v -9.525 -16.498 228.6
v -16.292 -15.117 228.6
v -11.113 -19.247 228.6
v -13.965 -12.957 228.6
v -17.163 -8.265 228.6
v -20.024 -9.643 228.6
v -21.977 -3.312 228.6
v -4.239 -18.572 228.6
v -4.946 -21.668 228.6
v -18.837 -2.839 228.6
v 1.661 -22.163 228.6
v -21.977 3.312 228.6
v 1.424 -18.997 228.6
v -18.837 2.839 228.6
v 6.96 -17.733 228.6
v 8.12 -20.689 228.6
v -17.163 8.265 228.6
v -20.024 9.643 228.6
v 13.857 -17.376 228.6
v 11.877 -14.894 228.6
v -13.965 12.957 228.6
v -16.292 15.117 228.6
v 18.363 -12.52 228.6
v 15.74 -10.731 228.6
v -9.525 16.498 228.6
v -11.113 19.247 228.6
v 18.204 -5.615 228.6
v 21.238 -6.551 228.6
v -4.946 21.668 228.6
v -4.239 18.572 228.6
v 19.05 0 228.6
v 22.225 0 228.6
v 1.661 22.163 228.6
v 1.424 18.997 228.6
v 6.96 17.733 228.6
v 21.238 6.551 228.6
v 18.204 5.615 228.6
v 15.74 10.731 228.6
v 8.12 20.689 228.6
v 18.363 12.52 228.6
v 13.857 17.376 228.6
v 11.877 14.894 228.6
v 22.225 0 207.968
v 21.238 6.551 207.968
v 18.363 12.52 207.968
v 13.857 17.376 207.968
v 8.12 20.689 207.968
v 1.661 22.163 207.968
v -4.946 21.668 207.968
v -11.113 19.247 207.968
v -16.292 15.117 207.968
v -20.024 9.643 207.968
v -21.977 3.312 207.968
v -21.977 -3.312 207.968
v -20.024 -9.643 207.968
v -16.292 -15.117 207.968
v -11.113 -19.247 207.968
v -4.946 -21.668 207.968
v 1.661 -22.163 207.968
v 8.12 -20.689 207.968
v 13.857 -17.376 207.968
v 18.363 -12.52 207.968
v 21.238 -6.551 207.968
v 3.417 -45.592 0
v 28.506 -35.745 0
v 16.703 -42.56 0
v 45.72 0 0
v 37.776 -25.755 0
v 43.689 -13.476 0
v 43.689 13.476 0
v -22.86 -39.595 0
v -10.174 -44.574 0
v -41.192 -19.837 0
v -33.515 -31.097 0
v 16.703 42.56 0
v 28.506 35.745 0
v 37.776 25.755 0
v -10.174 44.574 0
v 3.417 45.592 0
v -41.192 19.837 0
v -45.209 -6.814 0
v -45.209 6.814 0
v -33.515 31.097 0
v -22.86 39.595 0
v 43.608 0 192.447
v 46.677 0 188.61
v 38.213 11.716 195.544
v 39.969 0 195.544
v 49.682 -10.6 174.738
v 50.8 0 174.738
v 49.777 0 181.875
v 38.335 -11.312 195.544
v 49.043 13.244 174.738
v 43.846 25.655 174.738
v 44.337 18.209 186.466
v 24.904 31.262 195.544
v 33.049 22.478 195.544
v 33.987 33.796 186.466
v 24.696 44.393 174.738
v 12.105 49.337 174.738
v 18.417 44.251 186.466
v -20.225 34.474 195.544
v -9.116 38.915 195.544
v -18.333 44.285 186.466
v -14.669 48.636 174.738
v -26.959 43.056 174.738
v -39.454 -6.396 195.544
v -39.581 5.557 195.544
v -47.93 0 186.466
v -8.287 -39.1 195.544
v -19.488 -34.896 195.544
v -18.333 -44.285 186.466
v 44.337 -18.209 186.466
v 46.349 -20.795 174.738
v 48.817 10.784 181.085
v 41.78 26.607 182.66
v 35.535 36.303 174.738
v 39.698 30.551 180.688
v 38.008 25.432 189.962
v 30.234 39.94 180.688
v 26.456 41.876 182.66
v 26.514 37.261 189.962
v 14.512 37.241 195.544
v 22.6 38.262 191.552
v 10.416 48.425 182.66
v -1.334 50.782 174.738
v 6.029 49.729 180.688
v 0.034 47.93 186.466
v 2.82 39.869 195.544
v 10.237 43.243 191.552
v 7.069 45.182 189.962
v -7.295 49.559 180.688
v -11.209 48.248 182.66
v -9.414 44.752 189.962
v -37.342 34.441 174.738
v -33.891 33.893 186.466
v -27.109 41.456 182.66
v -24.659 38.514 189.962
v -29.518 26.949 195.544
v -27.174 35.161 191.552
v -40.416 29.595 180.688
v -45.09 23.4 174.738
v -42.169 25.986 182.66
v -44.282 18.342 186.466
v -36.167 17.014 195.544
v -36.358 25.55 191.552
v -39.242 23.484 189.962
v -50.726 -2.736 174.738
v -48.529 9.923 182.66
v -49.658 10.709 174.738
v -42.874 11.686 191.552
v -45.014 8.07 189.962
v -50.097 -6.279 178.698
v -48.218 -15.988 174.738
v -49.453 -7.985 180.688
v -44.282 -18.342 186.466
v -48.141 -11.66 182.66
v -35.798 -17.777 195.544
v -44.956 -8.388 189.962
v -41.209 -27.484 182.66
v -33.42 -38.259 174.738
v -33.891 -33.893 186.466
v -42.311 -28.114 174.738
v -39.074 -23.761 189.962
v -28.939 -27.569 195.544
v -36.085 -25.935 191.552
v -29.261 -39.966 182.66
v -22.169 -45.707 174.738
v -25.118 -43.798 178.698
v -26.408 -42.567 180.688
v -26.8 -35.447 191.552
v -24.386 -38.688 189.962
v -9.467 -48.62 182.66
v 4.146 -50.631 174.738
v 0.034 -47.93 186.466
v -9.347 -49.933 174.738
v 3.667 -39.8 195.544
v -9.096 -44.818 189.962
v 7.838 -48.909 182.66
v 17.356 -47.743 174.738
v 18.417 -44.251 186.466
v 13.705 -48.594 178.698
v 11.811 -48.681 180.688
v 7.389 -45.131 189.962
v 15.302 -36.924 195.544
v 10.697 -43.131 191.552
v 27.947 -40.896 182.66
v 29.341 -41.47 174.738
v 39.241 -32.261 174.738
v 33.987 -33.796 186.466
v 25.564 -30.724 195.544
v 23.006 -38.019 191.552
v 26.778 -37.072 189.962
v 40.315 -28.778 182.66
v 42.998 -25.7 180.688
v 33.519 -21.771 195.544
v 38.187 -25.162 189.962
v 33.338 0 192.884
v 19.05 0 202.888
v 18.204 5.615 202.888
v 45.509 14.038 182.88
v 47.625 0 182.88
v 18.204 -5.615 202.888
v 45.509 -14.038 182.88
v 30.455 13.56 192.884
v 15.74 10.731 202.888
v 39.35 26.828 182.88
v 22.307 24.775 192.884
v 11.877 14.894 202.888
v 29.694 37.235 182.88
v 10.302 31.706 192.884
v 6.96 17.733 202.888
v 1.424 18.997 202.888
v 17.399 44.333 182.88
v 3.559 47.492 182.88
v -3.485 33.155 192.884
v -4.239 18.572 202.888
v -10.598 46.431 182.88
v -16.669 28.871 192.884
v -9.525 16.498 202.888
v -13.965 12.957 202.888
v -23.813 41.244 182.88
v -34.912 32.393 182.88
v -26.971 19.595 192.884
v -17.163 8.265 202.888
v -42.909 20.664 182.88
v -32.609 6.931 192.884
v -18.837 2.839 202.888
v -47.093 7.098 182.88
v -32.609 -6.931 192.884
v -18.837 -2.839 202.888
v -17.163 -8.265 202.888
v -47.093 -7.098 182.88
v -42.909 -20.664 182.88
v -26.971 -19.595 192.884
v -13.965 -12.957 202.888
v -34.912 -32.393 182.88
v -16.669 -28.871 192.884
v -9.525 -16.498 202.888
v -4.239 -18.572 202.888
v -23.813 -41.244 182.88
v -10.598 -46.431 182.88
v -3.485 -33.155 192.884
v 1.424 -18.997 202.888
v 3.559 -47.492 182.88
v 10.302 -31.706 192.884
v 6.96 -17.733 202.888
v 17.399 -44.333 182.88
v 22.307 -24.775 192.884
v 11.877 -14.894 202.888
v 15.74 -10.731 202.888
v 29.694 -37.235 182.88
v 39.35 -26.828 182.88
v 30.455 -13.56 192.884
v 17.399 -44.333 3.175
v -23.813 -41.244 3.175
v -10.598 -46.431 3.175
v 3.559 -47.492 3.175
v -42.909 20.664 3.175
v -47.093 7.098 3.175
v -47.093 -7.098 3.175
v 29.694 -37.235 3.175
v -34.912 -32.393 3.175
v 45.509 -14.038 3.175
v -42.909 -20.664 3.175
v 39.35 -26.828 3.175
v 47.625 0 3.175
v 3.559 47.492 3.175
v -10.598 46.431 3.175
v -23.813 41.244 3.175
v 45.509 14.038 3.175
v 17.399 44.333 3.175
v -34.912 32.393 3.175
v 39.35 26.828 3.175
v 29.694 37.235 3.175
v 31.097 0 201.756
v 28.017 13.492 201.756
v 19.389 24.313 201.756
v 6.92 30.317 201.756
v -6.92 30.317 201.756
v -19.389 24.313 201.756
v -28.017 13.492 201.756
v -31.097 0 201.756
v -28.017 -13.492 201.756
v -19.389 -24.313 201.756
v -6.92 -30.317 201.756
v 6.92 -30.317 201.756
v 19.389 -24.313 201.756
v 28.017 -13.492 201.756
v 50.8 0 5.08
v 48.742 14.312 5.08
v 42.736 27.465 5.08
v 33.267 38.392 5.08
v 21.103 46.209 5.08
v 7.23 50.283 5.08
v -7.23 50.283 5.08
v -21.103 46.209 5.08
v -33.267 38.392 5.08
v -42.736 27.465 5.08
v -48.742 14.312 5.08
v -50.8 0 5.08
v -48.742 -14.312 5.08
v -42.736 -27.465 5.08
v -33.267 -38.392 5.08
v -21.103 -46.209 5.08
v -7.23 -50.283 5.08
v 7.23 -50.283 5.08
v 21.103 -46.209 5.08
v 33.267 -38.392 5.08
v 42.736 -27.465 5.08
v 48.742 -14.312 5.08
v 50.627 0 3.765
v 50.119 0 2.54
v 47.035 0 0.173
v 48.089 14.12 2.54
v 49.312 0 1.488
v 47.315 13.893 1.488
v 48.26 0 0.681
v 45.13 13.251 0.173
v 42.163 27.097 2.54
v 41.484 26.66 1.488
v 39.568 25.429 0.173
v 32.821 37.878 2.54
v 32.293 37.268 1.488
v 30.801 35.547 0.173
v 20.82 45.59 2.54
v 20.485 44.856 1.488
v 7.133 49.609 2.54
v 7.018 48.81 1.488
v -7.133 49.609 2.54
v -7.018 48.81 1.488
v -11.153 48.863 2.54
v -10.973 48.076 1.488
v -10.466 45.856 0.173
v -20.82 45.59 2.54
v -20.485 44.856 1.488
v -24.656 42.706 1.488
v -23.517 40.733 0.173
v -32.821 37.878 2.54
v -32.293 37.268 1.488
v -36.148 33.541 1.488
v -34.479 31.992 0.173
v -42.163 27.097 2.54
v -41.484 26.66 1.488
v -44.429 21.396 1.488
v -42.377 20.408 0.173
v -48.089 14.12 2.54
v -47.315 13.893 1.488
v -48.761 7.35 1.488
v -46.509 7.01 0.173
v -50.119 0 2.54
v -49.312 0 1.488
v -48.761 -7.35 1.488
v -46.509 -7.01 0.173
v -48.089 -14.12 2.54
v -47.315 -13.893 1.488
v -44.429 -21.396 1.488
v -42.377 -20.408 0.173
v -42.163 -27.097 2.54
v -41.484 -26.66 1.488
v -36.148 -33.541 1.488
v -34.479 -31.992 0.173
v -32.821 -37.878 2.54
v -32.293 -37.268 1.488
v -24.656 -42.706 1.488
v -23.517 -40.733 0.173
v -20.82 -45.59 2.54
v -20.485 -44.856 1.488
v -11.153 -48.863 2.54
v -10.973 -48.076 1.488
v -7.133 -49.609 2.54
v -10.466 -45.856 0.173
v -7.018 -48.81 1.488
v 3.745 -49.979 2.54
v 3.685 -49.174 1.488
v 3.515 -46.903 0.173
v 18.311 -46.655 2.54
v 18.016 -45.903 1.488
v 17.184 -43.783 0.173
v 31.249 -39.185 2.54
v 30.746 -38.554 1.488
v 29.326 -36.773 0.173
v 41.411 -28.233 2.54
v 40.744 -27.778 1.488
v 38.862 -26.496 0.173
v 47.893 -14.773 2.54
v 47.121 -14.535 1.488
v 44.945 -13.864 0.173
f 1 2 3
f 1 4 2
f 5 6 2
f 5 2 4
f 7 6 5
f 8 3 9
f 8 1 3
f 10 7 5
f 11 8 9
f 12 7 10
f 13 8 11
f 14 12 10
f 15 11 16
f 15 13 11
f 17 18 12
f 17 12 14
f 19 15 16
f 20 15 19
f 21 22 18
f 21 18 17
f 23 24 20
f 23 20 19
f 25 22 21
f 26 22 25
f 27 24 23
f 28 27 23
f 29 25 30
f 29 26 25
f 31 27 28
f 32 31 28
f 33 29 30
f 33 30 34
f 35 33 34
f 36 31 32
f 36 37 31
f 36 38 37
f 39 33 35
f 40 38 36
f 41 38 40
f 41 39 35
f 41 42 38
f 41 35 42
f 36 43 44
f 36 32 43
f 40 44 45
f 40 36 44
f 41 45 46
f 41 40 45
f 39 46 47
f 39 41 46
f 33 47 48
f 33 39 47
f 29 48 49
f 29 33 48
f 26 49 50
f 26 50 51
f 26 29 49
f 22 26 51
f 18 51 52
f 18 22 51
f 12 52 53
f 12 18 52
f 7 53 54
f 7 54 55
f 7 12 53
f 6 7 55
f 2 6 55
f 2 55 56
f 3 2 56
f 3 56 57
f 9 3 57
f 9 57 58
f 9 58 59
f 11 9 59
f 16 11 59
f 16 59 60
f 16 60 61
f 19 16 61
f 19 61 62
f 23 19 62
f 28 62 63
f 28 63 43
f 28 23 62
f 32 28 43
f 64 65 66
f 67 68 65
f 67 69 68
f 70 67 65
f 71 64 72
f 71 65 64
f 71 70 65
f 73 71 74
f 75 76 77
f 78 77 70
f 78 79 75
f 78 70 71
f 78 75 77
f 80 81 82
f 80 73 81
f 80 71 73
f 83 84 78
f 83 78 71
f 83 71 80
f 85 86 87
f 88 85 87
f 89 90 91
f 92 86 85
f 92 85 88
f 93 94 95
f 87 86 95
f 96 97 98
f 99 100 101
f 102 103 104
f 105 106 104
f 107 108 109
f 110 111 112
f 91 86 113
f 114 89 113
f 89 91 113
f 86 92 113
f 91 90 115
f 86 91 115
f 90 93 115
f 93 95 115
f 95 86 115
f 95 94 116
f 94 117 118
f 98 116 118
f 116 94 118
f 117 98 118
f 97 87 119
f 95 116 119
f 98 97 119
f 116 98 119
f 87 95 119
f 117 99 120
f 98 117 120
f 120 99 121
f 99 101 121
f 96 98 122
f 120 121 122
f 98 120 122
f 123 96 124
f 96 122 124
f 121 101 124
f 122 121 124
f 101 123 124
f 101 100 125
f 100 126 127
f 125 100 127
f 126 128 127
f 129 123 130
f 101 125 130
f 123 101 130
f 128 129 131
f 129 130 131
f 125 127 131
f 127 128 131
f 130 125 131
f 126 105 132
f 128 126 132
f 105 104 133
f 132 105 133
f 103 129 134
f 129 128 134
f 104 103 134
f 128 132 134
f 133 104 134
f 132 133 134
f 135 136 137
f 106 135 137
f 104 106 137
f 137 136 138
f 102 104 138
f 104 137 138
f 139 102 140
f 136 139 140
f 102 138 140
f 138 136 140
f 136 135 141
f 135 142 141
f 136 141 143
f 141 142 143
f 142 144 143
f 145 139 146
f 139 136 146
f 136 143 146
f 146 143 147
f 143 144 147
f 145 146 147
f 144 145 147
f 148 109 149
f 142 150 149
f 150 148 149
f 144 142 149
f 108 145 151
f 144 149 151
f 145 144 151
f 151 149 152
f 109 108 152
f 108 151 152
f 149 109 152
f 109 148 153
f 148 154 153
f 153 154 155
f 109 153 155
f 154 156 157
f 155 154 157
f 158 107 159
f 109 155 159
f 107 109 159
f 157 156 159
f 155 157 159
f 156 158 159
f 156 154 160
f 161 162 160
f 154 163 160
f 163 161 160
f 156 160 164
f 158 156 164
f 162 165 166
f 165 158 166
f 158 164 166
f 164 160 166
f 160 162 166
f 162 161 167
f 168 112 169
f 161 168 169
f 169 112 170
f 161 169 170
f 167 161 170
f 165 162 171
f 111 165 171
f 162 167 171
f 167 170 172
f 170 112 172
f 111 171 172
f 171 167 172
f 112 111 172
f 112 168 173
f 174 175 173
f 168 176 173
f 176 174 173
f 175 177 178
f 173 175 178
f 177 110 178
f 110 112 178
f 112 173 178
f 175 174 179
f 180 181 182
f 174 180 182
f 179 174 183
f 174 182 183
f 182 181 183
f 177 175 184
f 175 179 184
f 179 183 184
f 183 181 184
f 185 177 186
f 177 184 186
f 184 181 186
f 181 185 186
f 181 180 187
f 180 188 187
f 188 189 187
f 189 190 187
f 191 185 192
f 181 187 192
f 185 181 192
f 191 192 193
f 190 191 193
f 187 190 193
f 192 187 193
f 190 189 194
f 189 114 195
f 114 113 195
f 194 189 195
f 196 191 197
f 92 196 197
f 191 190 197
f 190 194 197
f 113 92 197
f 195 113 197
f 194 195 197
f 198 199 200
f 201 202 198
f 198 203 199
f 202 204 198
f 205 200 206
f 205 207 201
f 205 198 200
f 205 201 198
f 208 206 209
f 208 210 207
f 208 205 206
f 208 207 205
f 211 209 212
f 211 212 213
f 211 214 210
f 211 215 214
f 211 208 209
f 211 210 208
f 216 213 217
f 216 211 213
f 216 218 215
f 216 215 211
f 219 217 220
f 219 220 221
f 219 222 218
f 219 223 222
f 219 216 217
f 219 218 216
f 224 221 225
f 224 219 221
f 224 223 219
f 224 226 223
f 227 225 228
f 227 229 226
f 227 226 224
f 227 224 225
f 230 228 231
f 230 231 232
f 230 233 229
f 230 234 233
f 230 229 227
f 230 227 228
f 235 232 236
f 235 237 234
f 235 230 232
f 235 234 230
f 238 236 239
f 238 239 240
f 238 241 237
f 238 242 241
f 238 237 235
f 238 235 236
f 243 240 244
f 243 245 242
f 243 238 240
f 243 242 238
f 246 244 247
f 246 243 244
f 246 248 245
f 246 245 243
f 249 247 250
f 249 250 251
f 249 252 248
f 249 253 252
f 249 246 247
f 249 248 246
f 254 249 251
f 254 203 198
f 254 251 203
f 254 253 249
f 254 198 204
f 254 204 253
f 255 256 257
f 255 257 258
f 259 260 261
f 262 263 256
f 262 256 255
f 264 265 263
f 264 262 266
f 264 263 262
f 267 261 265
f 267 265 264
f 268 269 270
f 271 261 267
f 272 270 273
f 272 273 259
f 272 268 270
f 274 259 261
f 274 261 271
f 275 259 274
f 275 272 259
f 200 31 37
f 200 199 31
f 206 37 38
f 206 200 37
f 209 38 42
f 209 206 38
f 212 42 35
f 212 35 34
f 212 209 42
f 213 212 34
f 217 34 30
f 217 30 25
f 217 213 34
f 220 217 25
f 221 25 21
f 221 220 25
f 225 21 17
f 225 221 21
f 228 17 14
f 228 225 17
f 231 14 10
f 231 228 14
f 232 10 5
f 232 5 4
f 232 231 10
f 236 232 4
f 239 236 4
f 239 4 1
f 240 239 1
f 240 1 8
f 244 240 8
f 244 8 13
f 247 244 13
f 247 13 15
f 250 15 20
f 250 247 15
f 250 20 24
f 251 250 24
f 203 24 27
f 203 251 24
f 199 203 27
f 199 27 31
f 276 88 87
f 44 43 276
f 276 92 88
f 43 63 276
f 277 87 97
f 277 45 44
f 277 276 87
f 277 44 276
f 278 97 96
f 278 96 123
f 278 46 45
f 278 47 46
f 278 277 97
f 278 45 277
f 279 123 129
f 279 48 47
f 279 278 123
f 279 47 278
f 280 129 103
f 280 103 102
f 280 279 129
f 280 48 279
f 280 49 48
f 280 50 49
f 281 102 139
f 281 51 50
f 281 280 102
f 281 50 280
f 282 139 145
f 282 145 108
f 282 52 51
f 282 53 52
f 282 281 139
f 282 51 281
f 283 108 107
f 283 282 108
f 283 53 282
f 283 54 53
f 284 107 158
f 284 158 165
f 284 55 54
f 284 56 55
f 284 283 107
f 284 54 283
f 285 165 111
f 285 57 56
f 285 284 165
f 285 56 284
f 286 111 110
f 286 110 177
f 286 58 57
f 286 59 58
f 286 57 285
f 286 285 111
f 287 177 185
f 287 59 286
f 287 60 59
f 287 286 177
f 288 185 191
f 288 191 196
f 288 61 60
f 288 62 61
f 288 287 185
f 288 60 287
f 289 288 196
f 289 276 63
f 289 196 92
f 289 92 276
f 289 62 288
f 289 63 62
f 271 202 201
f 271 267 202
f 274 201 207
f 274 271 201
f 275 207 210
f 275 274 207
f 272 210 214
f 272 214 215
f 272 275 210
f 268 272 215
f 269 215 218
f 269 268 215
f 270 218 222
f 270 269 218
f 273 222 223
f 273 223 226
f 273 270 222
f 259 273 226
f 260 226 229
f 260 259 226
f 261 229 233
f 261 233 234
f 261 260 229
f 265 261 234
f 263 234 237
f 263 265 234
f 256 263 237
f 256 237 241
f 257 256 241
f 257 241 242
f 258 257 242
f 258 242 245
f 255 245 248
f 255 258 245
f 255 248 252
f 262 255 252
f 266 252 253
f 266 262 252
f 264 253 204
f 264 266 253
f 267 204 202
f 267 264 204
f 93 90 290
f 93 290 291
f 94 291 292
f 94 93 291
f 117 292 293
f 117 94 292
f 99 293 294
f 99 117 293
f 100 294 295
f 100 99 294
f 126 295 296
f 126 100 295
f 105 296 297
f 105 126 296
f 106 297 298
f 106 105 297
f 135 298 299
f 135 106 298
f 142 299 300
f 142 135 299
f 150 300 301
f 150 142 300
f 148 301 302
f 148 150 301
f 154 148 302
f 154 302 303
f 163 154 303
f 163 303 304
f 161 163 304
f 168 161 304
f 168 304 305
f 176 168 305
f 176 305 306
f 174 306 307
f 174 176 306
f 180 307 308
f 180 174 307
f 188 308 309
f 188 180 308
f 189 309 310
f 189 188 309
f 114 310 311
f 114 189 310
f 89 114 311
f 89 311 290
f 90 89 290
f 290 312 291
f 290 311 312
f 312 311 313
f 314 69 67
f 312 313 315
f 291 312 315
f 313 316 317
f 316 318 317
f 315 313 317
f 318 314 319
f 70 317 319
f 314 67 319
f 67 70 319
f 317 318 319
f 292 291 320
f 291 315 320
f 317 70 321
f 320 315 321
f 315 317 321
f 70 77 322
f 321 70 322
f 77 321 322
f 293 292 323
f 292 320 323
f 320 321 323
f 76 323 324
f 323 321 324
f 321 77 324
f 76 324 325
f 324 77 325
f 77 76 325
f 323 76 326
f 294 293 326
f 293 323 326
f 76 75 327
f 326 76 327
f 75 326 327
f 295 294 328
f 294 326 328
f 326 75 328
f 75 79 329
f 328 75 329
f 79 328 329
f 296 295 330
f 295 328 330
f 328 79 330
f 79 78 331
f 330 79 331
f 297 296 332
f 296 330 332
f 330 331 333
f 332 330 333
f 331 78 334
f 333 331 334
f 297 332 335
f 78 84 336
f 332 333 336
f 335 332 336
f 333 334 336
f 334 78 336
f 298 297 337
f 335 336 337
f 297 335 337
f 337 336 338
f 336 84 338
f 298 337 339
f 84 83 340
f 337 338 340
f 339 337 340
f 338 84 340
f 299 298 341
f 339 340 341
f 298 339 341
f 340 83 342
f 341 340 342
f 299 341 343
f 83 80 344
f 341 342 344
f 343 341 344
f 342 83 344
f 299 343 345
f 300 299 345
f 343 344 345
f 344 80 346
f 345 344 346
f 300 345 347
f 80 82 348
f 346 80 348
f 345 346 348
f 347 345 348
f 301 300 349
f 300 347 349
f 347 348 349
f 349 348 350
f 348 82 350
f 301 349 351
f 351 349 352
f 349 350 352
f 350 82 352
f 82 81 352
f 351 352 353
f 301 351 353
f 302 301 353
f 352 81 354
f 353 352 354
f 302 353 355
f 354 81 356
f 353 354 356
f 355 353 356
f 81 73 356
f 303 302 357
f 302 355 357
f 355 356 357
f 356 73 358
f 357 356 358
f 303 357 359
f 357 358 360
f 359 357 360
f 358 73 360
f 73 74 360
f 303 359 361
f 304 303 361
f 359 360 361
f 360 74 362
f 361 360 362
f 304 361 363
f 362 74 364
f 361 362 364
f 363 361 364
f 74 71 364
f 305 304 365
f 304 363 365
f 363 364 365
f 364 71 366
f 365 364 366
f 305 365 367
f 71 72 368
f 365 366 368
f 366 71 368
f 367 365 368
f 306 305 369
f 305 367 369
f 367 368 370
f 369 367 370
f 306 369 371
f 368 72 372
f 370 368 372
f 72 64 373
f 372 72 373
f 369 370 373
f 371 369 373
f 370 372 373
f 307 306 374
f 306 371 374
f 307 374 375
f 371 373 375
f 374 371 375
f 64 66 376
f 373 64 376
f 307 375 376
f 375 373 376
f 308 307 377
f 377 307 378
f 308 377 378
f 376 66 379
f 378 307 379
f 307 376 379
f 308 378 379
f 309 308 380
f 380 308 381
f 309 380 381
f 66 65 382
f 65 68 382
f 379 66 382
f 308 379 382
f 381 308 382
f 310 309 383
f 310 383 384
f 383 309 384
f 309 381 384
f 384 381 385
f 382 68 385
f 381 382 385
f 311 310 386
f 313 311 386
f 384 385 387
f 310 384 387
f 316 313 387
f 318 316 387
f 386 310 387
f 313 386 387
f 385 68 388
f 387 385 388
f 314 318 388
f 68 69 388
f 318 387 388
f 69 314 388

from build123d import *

# Parameters (mm, degrees)
F2_R = 25.4
F3_R = 5.08


with BuildPart() as f1:
    # F0 (on Front) → F1 (revolve)
    with BuildSketch(Plane.XZ):
        Polygon((22.225, 228.6), (19.05, 228.6), (19.05, 202.88843), (47.625, 182.88), (47.625, 3.175), (0, 3.175), (0, 0), (47.625, 0), (50.8, 0), (50.8, 187.96), (22.225, 207.96843), align=None)
    revolve(axis=Axis((0, 0, 114.3), (0, 0, 1)))

    # F2
    f2_edges = [f1.edges().sort_by_distance(p)[0] for p in [
        (-50.8, 0, 187.96),
    ]]
    fillet(f2_edges, radius=F2_R)

    # F3
    f3_edges = [f1.edges().sort_by_distance(p)[0] for p in [
        (-50.8, 0, 0),
    ]]
    fillet(f3_edges, radius=F3_R)


solid = f1.part
